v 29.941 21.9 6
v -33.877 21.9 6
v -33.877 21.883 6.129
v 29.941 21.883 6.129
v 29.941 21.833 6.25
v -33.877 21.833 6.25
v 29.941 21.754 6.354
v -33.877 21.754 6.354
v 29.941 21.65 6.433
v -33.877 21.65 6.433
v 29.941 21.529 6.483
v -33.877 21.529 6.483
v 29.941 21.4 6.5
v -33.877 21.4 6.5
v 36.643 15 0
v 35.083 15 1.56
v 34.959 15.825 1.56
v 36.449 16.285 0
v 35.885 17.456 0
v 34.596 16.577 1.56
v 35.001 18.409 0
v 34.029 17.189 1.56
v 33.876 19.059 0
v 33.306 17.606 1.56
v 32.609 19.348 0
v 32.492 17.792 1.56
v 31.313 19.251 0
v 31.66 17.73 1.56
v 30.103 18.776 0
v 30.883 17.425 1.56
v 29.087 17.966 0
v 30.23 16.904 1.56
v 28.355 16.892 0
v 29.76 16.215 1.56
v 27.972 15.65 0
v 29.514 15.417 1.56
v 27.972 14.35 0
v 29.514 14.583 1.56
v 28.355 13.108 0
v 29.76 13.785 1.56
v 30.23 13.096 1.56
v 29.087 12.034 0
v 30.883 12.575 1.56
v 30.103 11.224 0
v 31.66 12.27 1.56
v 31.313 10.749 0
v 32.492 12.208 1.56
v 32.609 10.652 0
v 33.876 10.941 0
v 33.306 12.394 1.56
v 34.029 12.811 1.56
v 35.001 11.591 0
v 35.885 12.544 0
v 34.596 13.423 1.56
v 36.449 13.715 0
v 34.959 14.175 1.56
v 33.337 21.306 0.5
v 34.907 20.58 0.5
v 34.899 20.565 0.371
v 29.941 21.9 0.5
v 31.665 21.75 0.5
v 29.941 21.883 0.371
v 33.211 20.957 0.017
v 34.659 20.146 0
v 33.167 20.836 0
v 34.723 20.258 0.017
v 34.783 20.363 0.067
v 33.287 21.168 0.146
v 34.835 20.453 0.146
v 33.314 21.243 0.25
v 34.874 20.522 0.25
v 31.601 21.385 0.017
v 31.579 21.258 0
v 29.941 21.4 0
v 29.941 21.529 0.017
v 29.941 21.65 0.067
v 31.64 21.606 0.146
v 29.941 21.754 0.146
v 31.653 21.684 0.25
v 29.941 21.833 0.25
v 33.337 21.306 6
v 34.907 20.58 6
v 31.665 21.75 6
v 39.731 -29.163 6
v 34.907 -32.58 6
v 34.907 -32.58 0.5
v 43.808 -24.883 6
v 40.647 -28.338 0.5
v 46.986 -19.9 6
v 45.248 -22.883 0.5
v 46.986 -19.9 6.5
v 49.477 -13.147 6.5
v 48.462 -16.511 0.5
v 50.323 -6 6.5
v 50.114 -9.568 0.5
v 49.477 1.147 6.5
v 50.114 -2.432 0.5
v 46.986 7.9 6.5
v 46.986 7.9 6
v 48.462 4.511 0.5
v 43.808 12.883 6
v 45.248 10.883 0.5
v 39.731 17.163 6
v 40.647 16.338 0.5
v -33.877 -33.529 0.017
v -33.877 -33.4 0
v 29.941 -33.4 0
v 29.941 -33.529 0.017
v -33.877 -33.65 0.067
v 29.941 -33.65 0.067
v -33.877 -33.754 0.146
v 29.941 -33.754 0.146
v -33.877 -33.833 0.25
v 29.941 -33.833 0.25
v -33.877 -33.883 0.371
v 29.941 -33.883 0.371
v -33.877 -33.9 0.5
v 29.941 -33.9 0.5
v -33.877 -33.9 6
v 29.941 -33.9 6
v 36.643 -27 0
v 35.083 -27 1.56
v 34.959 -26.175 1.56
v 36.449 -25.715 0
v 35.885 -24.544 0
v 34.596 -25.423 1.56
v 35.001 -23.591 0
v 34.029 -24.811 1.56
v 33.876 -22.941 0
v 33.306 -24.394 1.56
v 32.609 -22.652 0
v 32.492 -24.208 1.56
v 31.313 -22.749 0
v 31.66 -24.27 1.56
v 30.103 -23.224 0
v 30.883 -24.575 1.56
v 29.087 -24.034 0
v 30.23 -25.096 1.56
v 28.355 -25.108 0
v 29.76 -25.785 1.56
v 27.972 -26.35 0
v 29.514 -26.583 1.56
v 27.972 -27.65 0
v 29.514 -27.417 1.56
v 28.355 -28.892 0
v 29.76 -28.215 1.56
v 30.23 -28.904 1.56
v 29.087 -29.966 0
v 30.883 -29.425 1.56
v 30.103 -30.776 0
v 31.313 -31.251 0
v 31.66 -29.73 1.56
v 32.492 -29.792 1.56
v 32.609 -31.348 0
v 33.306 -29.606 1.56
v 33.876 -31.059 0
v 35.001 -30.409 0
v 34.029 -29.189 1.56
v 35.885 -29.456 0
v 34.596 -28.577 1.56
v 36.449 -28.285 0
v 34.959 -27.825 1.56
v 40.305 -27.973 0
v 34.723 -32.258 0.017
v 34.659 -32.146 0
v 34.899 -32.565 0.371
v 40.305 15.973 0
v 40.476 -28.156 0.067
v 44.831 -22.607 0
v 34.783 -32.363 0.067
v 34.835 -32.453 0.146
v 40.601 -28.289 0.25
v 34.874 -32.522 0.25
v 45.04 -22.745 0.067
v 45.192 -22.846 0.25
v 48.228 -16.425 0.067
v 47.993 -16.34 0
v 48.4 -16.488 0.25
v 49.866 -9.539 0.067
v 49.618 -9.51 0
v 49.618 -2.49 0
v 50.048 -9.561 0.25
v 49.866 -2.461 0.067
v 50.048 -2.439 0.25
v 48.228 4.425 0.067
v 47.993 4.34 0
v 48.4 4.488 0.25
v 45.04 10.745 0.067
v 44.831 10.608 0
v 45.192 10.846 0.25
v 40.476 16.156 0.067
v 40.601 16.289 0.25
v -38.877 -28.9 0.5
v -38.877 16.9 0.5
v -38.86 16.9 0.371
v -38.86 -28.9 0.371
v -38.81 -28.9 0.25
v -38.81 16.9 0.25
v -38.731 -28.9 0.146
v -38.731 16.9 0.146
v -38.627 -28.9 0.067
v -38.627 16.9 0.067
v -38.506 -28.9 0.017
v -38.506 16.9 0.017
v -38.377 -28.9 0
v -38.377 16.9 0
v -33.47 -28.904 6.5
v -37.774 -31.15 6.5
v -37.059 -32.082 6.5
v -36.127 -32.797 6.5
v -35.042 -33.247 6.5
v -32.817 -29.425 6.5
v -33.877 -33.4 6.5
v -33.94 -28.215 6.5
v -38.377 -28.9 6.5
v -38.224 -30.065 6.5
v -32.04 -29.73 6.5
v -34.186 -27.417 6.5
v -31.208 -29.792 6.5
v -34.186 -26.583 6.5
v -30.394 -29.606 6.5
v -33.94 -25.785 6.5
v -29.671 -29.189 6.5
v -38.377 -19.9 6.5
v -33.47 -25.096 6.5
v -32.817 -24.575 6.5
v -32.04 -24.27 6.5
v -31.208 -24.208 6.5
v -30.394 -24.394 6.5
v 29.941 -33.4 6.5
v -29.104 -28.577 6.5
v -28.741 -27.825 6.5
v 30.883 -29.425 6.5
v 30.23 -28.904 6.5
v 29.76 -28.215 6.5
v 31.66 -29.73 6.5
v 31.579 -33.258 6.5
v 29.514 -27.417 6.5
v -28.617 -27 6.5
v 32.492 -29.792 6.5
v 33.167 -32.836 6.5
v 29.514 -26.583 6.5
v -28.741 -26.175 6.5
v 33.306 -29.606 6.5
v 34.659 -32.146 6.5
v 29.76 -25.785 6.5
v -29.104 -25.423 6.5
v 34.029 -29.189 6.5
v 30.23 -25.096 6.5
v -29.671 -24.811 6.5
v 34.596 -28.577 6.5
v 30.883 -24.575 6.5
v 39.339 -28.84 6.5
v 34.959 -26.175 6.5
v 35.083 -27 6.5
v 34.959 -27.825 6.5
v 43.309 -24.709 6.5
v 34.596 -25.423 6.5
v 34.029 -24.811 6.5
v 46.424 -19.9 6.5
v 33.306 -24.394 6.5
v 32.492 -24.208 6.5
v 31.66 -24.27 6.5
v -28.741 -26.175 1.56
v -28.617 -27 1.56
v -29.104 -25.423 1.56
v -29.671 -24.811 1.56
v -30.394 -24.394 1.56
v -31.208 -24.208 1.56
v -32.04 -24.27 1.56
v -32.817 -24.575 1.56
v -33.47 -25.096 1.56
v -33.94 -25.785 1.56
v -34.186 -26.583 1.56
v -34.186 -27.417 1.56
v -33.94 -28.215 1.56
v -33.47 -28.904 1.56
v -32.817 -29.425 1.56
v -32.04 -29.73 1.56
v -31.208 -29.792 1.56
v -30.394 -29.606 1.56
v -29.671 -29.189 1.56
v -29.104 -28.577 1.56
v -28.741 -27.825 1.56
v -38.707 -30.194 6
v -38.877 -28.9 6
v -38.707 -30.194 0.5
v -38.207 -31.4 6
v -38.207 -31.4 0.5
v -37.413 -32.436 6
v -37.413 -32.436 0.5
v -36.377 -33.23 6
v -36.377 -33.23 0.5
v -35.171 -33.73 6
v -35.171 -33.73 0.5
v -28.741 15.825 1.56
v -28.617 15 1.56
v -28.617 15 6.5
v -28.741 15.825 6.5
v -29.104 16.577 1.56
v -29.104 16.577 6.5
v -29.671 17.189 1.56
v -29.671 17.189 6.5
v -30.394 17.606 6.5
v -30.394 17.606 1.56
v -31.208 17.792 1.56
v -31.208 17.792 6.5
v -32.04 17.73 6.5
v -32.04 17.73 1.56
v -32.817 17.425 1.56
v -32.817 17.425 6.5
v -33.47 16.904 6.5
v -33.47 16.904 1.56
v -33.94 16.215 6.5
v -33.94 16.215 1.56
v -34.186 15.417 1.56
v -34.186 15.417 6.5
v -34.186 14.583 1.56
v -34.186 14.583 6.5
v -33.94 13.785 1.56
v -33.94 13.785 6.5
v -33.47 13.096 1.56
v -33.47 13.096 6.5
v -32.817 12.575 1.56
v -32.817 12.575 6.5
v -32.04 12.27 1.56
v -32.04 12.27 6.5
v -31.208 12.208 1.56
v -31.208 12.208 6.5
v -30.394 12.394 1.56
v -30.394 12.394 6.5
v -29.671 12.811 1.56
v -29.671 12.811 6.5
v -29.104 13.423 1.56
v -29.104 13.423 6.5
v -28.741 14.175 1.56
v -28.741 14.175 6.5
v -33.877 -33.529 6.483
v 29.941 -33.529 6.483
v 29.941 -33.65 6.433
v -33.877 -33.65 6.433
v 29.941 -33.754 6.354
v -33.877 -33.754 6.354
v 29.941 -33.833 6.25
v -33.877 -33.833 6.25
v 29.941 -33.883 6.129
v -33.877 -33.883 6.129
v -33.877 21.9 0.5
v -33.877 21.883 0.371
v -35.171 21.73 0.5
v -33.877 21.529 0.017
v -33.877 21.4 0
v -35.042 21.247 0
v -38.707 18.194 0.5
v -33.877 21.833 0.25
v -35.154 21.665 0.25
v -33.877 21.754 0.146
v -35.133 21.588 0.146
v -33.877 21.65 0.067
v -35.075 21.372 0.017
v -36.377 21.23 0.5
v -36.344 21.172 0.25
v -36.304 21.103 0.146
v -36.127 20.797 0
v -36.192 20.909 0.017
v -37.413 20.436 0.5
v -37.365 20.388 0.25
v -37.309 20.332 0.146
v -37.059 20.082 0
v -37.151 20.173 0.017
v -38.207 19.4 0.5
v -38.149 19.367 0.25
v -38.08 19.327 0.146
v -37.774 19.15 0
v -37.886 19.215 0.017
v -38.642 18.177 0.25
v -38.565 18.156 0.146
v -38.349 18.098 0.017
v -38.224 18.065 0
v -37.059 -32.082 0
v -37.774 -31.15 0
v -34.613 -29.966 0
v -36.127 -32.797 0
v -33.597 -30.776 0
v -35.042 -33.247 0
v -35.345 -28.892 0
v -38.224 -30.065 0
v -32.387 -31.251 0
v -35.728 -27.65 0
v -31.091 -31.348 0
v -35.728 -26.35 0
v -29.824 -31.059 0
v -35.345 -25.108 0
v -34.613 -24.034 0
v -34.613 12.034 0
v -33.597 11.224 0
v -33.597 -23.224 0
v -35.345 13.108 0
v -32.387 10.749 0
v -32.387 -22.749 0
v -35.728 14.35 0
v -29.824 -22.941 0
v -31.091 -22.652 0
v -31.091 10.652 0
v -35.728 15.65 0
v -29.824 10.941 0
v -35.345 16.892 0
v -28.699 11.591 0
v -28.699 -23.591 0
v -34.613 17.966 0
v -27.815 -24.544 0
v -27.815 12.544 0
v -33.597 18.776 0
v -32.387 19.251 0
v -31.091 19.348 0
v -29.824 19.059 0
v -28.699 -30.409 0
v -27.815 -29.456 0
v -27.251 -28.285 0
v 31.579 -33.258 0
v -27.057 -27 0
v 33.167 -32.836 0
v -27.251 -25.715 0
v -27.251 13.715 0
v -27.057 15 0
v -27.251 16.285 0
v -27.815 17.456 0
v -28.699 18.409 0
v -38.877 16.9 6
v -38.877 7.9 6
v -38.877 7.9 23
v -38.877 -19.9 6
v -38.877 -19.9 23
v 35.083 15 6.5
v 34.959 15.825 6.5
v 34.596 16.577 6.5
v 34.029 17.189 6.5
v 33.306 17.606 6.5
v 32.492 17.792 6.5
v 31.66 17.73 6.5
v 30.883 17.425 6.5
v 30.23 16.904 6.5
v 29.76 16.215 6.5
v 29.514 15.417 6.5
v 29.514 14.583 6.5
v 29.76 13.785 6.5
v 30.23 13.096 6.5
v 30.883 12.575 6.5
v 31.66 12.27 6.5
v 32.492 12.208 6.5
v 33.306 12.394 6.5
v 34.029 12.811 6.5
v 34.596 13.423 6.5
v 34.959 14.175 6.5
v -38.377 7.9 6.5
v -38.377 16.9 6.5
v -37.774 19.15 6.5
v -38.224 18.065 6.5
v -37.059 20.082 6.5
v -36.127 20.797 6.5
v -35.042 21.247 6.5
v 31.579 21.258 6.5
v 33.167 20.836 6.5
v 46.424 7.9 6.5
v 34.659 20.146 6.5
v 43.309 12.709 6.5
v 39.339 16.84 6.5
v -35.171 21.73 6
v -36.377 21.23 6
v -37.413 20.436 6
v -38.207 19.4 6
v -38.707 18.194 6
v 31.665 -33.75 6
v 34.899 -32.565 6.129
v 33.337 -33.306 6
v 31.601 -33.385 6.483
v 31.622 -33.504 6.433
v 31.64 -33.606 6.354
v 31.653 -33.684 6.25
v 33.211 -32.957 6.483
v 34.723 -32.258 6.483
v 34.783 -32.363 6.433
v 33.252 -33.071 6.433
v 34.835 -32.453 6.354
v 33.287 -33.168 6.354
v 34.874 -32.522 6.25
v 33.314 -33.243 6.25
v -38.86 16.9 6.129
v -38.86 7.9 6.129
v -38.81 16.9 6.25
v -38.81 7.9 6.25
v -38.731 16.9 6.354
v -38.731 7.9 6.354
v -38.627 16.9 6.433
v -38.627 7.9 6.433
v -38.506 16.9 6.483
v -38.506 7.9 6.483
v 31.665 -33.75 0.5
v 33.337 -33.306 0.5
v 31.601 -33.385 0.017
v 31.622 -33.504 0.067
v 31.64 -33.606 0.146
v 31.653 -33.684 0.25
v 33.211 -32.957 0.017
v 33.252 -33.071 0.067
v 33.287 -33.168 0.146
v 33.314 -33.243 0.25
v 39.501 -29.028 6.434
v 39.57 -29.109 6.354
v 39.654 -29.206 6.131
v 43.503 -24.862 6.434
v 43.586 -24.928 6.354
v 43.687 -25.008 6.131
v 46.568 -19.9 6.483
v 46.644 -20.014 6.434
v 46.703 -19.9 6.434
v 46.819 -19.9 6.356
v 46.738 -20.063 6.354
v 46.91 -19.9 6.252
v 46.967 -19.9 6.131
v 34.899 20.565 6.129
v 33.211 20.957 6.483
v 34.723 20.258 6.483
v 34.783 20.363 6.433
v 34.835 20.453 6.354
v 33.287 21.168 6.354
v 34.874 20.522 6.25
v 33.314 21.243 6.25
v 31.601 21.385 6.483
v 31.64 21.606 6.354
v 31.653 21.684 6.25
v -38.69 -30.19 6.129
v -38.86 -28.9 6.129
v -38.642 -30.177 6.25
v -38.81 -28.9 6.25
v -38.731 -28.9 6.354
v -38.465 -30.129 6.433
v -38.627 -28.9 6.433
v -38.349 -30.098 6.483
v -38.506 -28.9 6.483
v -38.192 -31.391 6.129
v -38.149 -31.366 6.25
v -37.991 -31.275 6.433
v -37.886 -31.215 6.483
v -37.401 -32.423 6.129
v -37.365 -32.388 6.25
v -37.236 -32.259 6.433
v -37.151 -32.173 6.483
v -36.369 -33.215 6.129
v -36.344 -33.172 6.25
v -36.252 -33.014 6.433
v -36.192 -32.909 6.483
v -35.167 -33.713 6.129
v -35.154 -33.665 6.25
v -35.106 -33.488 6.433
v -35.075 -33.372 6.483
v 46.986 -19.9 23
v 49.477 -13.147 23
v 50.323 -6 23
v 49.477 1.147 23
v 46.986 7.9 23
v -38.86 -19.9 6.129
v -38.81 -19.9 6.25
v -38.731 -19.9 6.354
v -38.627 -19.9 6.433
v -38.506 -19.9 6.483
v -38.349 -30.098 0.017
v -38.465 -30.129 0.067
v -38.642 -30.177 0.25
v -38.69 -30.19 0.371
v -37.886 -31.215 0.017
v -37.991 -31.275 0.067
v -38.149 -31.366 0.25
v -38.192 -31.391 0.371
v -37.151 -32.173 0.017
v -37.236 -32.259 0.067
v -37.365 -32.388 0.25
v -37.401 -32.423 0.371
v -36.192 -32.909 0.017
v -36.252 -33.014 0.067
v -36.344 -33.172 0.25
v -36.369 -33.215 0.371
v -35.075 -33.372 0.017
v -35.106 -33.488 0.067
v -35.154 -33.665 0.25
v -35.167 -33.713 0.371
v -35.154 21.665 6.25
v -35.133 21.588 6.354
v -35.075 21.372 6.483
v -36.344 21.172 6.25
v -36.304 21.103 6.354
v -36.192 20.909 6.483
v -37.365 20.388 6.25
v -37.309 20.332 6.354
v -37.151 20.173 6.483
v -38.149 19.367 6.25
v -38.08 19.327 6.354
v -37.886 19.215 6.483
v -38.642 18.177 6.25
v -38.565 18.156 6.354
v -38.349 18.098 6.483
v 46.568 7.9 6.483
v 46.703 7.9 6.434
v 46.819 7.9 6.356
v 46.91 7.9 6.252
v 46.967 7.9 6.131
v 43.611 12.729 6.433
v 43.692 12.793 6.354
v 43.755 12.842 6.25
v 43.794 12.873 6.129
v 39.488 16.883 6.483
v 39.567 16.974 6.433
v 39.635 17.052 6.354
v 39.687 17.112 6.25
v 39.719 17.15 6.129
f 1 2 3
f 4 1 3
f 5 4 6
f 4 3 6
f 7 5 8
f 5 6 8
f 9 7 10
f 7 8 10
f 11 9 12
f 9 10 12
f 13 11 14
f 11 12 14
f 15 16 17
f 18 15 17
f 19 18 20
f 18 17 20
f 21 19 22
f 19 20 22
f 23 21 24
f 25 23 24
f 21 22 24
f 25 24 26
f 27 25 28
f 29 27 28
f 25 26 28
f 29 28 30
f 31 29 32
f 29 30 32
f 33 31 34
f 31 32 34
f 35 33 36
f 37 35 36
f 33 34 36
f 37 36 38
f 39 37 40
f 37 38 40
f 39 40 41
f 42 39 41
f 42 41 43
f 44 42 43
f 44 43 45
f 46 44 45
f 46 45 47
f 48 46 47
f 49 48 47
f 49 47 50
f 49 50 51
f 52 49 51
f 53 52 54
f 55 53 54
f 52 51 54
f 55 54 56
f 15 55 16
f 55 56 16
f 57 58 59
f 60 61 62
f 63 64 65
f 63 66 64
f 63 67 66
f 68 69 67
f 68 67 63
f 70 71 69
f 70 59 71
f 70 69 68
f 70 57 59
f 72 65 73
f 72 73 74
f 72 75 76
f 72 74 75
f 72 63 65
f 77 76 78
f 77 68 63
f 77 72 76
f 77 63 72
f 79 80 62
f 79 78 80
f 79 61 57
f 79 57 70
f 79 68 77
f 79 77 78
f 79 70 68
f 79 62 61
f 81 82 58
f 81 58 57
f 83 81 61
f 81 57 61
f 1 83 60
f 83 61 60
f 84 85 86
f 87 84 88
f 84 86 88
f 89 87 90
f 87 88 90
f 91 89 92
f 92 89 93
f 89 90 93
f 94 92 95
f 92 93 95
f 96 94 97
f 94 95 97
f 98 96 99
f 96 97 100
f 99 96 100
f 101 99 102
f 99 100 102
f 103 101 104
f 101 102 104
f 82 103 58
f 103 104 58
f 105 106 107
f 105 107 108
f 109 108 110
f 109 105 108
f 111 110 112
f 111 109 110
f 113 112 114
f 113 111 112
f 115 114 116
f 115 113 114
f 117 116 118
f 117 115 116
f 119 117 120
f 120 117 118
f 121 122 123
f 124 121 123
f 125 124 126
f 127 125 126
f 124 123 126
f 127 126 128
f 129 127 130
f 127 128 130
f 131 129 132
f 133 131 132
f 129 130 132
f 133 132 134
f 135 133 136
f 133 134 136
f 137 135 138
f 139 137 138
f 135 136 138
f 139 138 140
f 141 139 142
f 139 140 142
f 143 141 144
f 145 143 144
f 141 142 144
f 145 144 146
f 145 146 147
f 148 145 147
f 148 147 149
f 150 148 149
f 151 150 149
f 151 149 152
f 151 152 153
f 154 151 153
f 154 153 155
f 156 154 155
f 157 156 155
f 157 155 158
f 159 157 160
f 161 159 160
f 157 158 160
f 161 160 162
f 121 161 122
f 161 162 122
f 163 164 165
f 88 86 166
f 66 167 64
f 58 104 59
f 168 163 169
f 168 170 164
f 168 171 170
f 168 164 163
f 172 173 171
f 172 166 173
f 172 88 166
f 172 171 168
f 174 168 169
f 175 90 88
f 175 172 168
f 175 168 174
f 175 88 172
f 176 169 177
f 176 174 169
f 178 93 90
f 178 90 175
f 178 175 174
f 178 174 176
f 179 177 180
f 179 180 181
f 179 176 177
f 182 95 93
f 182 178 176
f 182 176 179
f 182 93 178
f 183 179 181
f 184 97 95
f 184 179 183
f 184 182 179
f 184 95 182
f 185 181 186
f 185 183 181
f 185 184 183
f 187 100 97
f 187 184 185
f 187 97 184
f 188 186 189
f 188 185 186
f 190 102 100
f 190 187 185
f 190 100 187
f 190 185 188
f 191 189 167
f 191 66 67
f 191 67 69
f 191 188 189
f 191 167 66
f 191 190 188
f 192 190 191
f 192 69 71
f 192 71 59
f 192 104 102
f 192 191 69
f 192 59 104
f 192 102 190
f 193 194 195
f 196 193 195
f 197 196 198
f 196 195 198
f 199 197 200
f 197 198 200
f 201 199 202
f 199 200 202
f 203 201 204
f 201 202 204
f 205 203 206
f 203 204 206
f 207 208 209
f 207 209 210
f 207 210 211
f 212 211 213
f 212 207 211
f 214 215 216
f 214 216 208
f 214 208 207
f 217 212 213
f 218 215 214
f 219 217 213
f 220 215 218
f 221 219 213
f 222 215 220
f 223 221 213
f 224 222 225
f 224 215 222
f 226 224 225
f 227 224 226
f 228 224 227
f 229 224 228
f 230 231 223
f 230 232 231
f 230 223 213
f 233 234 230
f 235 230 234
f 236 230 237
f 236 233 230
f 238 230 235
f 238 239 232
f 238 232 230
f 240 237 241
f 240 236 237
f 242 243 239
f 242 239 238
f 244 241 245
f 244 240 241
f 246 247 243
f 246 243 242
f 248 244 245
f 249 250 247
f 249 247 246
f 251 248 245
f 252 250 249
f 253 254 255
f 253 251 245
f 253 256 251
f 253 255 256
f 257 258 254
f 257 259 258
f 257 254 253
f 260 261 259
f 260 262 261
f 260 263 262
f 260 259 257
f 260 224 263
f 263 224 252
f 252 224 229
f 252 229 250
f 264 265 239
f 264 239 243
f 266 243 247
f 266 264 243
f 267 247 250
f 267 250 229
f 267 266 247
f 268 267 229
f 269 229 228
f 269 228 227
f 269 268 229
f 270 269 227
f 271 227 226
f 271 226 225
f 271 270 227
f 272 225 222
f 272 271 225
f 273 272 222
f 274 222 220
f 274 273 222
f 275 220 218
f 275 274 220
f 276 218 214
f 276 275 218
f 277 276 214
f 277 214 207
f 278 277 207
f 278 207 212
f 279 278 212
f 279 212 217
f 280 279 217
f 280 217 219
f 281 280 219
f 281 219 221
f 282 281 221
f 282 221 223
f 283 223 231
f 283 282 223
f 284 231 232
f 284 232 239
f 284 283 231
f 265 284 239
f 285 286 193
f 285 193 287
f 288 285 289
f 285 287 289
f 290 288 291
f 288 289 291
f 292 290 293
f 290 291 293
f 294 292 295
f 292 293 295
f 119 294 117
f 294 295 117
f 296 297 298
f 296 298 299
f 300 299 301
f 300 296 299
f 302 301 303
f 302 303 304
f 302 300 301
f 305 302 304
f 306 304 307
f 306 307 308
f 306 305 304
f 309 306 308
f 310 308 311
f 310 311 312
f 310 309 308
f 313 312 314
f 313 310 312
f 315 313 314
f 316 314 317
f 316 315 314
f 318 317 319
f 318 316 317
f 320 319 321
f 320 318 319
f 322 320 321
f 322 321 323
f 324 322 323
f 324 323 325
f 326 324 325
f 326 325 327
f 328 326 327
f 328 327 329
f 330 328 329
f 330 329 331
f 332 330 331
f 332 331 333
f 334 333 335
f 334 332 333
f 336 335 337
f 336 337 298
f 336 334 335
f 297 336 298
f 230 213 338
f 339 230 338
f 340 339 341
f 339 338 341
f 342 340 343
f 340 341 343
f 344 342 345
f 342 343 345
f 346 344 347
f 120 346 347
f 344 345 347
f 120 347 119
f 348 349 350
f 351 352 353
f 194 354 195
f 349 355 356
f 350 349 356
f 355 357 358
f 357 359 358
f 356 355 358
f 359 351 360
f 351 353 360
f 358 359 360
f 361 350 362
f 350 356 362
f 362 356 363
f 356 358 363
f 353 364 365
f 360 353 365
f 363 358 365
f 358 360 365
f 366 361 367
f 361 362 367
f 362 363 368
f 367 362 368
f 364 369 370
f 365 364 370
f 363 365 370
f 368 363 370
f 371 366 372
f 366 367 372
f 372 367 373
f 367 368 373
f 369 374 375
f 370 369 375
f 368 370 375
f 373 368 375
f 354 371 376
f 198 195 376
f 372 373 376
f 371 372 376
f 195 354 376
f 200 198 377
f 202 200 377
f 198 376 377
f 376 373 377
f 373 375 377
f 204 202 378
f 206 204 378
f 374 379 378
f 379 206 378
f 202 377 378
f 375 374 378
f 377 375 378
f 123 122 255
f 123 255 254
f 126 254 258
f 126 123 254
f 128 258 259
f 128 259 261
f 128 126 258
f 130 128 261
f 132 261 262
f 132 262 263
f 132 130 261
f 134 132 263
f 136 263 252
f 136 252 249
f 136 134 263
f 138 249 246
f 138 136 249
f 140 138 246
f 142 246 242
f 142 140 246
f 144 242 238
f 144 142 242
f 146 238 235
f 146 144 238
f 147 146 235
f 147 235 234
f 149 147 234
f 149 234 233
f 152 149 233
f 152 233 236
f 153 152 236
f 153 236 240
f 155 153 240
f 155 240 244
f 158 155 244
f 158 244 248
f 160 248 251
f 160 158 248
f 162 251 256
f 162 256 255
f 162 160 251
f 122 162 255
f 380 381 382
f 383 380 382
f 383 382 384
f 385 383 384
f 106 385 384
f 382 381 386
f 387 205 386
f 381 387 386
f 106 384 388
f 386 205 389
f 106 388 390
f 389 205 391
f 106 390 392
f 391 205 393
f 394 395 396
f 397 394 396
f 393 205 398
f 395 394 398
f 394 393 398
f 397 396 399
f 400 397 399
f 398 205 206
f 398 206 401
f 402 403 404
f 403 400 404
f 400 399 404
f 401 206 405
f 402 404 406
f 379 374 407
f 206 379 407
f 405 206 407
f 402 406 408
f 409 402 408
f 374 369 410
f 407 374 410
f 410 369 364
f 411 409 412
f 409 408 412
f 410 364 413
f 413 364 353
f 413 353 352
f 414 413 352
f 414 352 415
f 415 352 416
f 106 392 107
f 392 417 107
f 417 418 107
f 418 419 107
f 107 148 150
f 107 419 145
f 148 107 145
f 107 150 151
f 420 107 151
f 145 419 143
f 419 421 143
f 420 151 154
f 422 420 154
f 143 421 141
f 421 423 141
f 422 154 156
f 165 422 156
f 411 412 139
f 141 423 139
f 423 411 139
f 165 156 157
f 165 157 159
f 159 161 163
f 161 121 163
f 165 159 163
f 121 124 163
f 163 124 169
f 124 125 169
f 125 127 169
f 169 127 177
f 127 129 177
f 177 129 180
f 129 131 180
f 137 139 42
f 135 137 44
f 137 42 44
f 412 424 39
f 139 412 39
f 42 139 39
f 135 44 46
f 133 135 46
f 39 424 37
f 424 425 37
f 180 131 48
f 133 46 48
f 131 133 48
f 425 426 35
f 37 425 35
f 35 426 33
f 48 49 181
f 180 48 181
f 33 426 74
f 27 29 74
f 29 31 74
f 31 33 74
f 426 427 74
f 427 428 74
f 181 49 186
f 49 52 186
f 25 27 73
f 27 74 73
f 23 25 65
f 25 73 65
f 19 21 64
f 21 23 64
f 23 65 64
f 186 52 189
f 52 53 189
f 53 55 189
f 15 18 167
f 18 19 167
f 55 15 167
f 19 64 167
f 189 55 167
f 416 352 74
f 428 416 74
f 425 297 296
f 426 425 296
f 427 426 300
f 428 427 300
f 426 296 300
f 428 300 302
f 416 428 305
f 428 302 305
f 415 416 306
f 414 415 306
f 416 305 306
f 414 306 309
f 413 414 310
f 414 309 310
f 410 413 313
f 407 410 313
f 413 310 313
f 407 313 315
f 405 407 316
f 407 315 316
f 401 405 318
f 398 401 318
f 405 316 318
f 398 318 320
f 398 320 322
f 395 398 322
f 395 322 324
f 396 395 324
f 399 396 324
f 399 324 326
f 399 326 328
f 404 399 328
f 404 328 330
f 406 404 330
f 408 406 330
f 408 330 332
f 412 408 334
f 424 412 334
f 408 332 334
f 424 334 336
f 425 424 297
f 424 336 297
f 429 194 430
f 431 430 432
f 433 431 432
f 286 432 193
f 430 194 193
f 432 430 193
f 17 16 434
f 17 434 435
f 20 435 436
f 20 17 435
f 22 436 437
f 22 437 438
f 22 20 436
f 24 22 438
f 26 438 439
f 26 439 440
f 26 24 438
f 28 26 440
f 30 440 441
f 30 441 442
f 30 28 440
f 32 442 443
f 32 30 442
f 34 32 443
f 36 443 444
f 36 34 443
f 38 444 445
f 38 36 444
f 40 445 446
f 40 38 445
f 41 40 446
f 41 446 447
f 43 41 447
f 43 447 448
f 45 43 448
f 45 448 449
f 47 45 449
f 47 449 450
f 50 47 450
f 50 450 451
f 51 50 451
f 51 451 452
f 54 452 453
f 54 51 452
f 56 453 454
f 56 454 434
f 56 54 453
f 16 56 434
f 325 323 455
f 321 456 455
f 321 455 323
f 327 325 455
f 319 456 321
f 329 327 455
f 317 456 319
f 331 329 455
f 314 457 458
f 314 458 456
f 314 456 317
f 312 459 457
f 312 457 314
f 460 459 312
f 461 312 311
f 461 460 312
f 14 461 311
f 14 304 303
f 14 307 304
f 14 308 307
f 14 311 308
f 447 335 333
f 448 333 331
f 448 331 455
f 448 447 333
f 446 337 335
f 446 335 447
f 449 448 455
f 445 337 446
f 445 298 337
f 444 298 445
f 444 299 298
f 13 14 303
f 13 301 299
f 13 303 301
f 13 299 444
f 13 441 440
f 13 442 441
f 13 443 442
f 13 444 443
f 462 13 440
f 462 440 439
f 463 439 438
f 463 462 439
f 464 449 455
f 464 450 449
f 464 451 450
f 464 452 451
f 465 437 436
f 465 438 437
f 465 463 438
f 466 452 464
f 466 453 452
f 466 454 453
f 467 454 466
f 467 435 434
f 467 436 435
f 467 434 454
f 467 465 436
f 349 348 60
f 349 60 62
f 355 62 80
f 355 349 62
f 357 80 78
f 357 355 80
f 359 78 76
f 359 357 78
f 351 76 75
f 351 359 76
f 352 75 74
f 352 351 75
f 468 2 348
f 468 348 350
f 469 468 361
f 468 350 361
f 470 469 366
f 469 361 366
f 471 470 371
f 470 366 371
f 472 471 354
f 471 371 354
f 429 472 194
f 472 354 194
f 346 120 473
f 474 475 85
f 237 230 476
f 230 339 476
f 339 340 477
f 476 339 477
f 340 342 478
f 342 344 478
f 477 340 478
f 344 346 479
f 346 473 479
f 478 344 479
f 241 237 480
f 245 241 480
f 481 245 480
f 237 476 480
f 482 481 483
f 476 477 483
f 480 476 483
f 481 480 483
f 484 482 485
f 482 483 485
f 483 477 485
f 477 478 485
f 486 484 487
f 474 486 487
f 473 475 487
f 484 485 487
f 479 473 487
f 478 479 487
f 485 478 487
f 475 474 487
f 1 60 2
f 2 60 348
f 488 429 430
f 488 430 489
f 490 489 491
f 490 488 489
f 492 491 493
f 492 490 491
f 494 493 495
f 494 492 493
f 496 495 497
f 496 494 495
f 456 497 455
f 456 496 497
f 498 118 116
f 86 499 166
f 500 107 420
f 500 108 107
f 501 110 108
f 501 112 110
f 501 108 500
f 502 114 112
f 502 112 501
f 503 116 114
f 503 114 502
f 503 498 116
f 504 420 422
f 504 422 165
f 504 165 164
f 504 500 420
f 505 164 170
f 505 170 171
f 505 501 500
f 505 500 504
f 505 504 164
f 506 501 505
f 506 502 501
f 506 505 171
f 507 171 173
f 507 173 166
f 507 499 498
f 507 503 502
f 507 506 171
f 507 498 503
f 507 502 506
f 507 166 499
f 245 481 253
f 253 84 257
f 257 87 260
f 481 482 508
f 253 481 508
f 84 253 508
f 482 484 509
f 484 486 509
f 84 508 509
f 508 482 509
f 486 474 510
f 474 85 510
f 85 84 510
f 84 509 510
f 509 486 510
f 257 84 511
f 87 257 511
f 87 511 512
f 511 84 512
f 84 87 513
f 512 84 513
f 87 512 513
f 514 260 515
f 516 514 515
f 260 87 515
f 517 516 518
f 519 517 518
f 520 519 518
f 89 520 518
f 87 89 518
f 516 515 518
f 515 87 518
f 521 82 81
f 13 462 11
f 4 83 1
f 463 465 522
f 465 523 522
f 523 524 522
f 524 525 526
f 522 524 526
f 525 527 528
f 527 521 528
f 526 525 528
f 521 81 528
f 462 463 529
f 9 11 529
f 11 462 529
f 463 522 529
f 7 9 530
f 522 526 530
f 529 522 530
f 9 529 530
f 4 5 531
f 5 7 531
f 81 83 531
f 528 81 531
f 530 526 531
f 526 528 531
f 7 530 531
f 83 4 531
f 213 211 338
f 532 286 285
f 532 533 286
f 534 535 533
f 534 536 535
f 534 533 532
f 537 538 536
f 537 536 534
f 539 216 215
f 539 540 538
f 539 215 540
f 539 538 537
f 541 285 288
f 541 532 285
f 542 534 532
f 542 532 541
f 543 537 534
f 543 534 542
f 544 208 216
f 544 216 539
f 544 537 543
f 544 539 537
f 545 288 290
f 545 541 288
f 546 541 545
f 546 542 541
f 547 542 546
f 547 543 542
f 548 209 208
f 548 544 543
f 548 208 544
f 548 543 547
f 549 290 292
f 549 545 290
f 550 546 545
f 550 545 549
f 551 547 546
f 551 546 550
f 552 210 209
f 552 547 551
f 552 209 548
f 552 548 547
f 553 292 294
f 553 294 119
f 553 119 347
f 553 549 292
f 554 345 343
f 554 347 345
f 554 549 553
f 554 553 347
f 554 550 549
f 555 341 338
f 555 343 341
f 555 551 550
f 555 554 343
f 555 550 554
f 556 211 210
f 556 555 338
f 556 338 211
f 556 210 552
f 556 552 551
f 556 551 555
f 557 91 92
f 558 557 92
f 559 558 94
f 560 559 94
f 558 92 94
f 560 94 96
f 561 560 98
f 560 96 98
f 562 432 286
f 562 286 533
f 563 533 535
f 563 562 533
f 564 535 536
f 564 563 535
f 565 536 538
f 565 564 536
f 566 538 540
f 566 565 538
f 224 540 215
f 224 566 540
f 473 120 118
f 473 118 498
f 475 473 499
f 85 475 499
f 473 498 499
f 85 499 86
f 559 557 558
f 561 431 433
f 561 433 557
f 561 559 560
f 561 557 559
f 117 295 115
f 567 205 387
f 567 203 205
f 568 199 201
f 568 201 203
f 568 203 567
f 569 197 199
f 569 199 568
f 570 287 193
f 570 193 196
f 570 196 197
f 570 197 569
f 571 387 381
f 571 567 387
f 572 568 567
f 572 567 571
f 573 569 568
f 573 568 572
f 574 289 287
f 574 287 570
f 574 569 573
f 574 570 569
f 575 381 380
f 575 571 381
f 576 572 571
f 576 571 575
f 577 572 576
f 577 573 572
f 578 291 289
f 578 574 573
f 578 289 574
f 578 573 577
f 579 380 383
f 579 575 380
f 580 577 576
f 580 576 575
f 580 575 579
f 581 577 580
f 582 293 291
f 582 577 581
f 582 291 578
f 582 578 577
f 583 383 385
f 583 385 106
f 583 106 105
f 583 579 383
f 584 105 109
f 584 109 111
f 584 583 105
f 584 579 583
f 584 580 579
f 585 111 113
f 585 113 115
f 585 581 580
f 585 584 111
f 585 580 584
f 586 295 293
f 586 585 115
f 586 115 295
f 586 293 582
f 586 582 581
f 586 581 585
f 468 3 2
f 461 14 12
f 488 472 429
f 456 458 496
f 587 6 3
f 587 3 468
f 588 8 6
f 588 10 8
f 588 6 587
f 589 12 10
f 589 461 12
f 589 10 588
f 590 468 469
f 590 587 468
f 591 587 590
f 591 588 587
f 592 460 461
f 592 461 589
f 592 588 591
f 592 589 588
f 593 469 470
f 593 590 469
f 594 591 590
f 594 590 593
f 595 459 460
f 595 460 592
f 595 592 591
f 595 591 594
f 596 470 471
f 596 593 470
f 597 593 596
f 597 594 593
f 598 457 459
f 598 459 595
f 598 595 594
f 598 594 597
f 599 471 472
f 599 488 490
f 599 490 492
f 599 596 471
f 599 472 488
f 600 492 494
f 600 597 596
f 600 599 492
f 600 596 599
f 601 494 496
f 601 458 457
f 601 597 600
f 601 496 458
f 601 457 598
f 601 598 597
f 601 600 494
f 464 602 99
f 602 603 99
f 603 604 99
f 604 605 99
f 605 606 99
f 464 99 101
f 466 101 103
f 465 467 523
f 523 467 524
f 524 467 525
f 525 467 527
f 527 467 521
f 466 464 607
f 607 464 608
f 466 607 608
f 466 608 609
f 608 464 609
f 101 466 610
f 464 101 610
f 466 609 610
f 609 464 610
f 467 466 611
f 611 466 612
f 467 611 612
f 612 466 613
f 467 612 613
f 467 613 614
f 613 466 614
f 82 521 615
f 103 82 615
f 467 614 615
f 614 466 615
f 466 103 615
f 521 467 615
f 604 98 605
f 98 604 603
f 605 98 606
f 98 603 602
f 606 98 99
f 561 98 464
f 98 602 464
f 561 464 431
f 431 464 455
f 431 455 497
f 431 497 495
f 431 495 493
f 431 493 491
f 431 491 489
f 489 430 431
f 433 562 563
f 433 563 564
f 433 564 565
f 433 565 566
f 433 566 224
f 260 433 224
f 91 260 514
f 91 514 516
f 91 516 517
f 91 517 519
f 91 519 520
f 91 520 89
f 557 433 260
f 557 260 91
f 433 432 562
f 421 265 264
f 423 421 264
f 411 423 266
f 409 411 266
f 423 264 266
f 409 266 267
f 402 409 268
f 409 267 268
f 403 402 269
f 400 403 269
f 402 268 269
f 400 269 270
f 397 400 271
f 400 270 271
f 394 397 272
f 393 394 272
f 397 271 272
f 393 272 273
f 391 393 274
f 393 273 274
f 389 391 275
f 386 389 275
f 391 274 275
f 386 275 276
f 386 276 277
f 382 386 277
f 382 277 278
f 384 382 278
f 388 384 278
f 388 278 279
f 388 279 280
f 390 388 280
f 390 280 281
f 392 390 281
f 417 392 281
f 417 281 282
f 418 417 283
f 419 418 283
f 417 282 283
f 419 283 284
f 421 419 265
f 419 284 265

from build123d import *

# Parameters (mm, degrees)
F0_R         = 2.8
F1_DEPTH     = 6.5
F3_DEPTH     = 16.5
F4_T1_DEPTH  = 63.8184719387
F4_T3_DEPTH  = 45.8
F4_T5_DEPTH  = 9
F4_T7_DEPTH  = 9
F4_T10_ANGLE = 90
F4_T12_ANGLE = 120.4504110916
F4_T14_ANGLE = 90
F4_T16_ANGLE = 90
F4_T18_ANGLE = 29.7747944542
F4_T20_ANGLE = 29.7747944542
F4_T22_ANGLE = 29.7747944542
F4_T26_ANGLE = 35.5690080159
F4_T29_ANGLE = 90
F4_T33_ANGLE = 35.5690080159
F4_T36_ANGLE = 29.7747944542
F5_SIZE      = 1.56


# Not quite as in the source:
# - a fillet or chamfer that OpenCascade refuses, or shapes differently, is made with other operations: its cross-section is extruded or revolved along the edge and cut away or added


with BuildPart() as f1:
    # F0 (on Top) → F1 (new body)
    with BuildSketch(Plane.XY):
        with BuildLine():
            Line((-38.8770699501, 16.9000072956), (-38.8770699501, -28.8999927044))
            ThreePointArc((-38.8770699501, -28.8999927044), (-37.412603856, -32.4355266103), (-33.8770699501, -33.8999927044))
            Line((-33.8770699501, -33.8999927044), (29.9414019886, -33.8999927044))
            ThreePointArc((29.9414019886, -33.8999927044), (32.5106042183, -33.5643188528), (34.9073236464, -32.579832685))
            ThreePointArc((34.9073236464, -32.579832685), (50.3229300499, -5.9999927044), (34.9073236464, 20.5798472762))
            ThreePointArc((34.9073236464, 20.5798472762), (32.5106042183, 21.564333444), (29.9414019886, 21.9000072956))
            Line((29.9414019886, 21.9000072956), (-33.8770699501, 21.9000072956))
            ThreePointArc((-33.8770699501, 21.9000072956), (-37.412603856, 20.4355412015), (-38.8770699501, 16.9000072956))
        make_face()
        with Locations((-31.4170904458, -26.9999932498)):
            Circle(F0_R, mode=Mode.SUBTRACT)
        with Locations((32.2829300499, -26.9999927044)):
            Circle(F0_R, mode=Mode.SUBTRACT)
        with Locations((-31.4170904458, 15.0000071153)):
            Circle(F0_R, mode=Mode.SUBTRACT)
        with Locations((32.2829300499, 15.0000072956)):
            Circle(F0_R, mode=Mode.SUBTRACT)
    extrude(amount=F1_DEPTH)

    # F2 (on face) → F3 (join)
    with BuildSketch(Plane.XY.offset(6.5)):
        with BuildLine():
            Line((-38.8770699501, 7.9000072956), (-38.8770699501, -5.9999927044))
            Line((-38.8770699501, -5.9999927044), (-38.8770699501, -19.8999927044))
            Line((-38.8770699501, -19.8999927044), (46.9864613892, -19.8999927044))
            ThreePointArc((46.9864613892, -19.8999927044), (50.3229300499, -5.9999927044), (46.9864613892, 7.9000072956))
            Line((46.9864613892, 7.9000072956), (-38.8770699501, 7.9000072956))
        make_face()
    extrude(amount=F3_DEPTH)

    # F4: fillet of radius 0.5 on 18 edges, made by hand

    # F4_s2 → F4_t1 (cut)
    with BuildSketch(Plane.YZ.offset(-33.8770699501)):
        with BuildLine():
            ThreePointArc((21.9000072956, 0.5), (21.7535606862, 0.1464466094), (21.4000072956, 0))
            Line((21.4000072956, 0), (21.9000072956, 0))
            Line((21.9000072956, 0), (21.9000072956, 0.5))
        make_face()
        with BuildLine():
            ThreePointArc((21.9000072956, 6), (21.7535606862, 6.3535533906), (21.4000072956, 6.5))
            Line((21.4000072956, 6.5), (21.9000072956, 6.5))
            Line((21.9000072956, 6.5), (21.9000072956, 6))
        make_face()
        with BuildLine():
            ThreePointArc((-33.3999927044, 6.5), (-33.753546095, 6.3535533906), (-33.8999927044, 6))
            Line((-33.8999927044, 6), (-33.8999927044, 6.5))
            Line((-33.8999927044, 6.5), (-33.3999927044, 6.5))
        make_face()
        with BuildLine():
            ThreePointArc((-33.3999927044, 0), (-33.753546095, 0.1464466094), (-33.8999927044, 0.5))
            Line((-33.8999927044, 0.5), (-33.8999927044, 0))
            Line((-33.8999927044, 0), (-33.3999927044, 0))
        make_face()
    extrude(amount=F4_T1_DEPTH, mode=Mode.SUBTRACT)

    # F4_s4 → F4_t3 (cut)
    with BuildSketch(Plane.XZ.offset(-16.9000072956)):
        with BuildLine():
            ThreePointArc((-38.8770699501, 0.5), (-38.7306233407, 0.1464466094), (-38.3770699501, 0))
            Line((-38.3770699501, 0), (-38.8770699501, 0))
            Line((-38.8770699501, 0), (-38.8770699501, 0.5))
        make_face()
    extrude(amount=F4_T3_DEPTH, mode=Mode.SUBTRACT)

    # F4_s6 → F4_t5 (cut)
    with BuildSketch(Plane.XZ.offset(-16.9000072956)):
        with BuildLine():
            ThreePointArc((-38.8770699501, 6), (-38.7306233407, 6.3535533906), (-38.3770699501, 6.5))
            Line((-38.3770699501, 6.5), (-38.8770699501, 6.5))
            Line((-38.8770699501, 6.5), (-38.8770699501, 6))
        make_face()
    extrude(amount=F4_T5_DEPTH, mode=Mode.SUBTRACT)

    # F4_s8 → F4_t7 (cut)
    with BuildSketch(Plane.XZ.offset(19.8999927044)):
        with BuildLine():
            ThreePointArc((-38.8770699501, 6), (-38.7306233407, 6.3535533906), (-38.3770699501, 6.5))
            Line((-38.3770699501, 6.5), (-38.8770699501, 6.5))
            Line((-38.8770699501, 6.5), (-38.8770699501, 6))
        make_face()
    extrude(amount=F4_T7_DEPTH, mode=Mode.SUBTRACT)

    # F4_s9 → F4_t10 (revolve, cut)
    with BuildSketch(Plane.YZ.offset(-33.8770699501)):
        with BuildLine():
            ThreePointArc((21.9000072956, 0.5), (21.7535606862, 0.1464466094), (21.4000072956, 0))
            Line((21.4000072956, 0), (21.9000072956, 0))
            Line((21.9000072956, 0), (21.9000072956, 0.5))
        make_face()
    revolve(axis=Axis((-33.8770699501, 16.9000072956, 0), (0, 0, 1)), revolution_arc=F4_T10_ANGLE, mode=Mode.SUBTRACT)

    # F4_s11 → F4_t12 (revolve, cut)
    with BuildSketch(Plane(origin=(12.2560283734, 7.0119353437, 0), x_dir=(0, 0, 1), z_dir=(-0.8679839981, -0.4965921658, 0))):
        with BuildLine():
            ThreePointArc((0, -45.1134768811), (0.1464466094, -45.4670302717), (0.5, -45.6134768811))
            Line((0.5, -45.6134768811), (0, -45.6134768811))
            Line((0, -45.6134768811), (0, -45.1134768811))
        make_face()
    revolve(axis=Axis((19.7004300499, -5.9999927044, 0), (0, 0, 1)), revolution_arc=F4_T12_ANGLE, mode=Mode.SUBTRACT)

    # F4_s13 → F4_t14 (revolve, cut)
    with BuildSketch(Plane.YZ.offset(-33.8770699501)):
        with BuildLine():
            ThreePointArc((21.9000072956, 6), (21.7535606862, 6.3535533906), (21.4000072956, 6.5))
            Line((21.4000072956, 6.5), (21.9000072956, 6.5))
            Line((21.9000072956, 6.5), (21.9000072956, 6))
        make_face()
    revolve(axis=Axis((-33.8770699501, 16.9000072956, 6.5), (0, 0, 1)), revolution_arc=F4_T14_ANGLE, mode=Mode.SUBTRACT)

    # F4_s15 → F4_t16 (revolve, cut)
    with BuildSketch(Plane.XZ.offset(28.8999927044)):
        with BuildLine():
            ThreePointArc((-38.3770699501, 0), (-38.7306233407, 0.1464466094), (-38.8770699501, 0.5))
            Line((-38.8770699501, 0.5), (-38.8770699501, 0))
            Line((-38.8770699501, 0), (-38.3770699501, 0))
        make_face()
    revolve(axis=Axis((-33.8770699501, -28.8999927044, 0), (0, 0, 1)), revolution_arc=F4_T16_ANGLE, mode=Mode.SUBTRACT)

    # F4_s17 → F4_t18 (revolve, cut)
    with BuildSketch(Plane.YZ.offset(29.9414019886)):
        with BuildLine():
            ThreePointArc((-33.3999927044, 0), (-33.753546095, 0.1464466094), (-33.8999927044, 0.5))
            Line((-33.8999927044, 0.5), (-33.8999927044, 0))
            Line((-33.8999927044, 0), (-33.3999927044, 0))
        make_face()
    revolve(axis=Axis((29.9414019886, -23.8999927044, 0), (0, 0, 1)), revolution_arc=F4_T18_ANGLE, mode=Mode.SUBTRACT)

    # F4_s19 → F4_t20 (revolve, cut)
    with BuildSketch(Plane(origin=(17.4284307256, -9.9711770948, 0), x_dir=(0, 0, 1), z_dir=(0.8679839981, -0.4965921658, 0))):
        with BuildLine():
            ThreePointArc((0, -34.6976815693), (0.1464466094, -35.0512349599), (0.5, -35.1976815693))
            Line((0.5, -35.1976815693), (0, -35.1976815693))
            Line((0, -35.1976815693), (0, -34.6976815693))
        make_face()
    revolve(axis=Axis((29.9414019886, 11.9000072956, 0), (0, 0, 1)), revolution_arc=F4_T20_ANGLE, mode=Mode.SUBTRACT)

    # F4_s21 → F4_t22 (revolve, cut)
    with BuildSketch(Plane(origin=(17.4284307256, -9.9711770948, 0), x_dir=(0, 0, 1), z_dir=(0.8679839981, -0.4965921658, 0))):
        with BuildLine():
            ThreePointArc((6.5, -34.6976815693), (6.3535533906, -35.0512349599), (6, -35.1976815693))
            Line((6, -35.1976815693), (6.5, -35.1976815693))
            Line((6.5, -35.1976815693), (6.5, -34.6976815693))
        make_face()
    revolve(axis=Axis((29.9414019886, 11.9000072956, 6.5), (0, 0, 1)), revolution_arc=F4_T22_ANGLE, mode=Mode.SUBTRACT)


with BuildPart() as f4_tool24:
    # F4_s25 → F4_t26 (revolve)
    with BuildSketch(Plane(origin=(5.7033446243, -12.4249727464, 0), x_dir=(0, 0, 1), z_dir=(0.4171723997, -0.9088273703, 0))):
        with BuildLine():
            ThreePointArc((6.5, -45.5237586807), (6.3535533906, -45.8773120713), (6, -46.0237586807))
            Line((6, -46.0237586807), (6.5, -46.0237586807))
            Line((6.5, -46.0237586807), (6.5, -45.5237586807))
        make_face()
    revolve(axis=Axis((19.7004300499, -5.9999927044, 6.5), (0, 0, 1)), revolution_arc=F4_T26_ANGLE)

    split(bisect_by=Plane.XZ.offset(-7.9000072956), keep=Keep.BOTTOM)


with BuildPart() as f1_1:
    add(f1.part)

    # F4_t23: cut F4_tool24
    add(f4_tool24.part, mode=Mode.SUBTRACT)

    # F4_s28 → F4_t29 (revolve, cut)
    with BuildSketch(Plane.XZ.offset(28.8999927044)):
        with BuildLine():
            ThreePointArc((-38.8770699501, 6), (-38.7306233407, 6.3535533906), (-38.3770699501, 6.5))
            Line((-38.3770699501, 6.5), (-38.8770699501, 6.5))
            Line((-38.8770699501, 6.5), (-38.8770699501, 6))
        make_face()
    revolve(axis=Axis((-33.8770699501, -28.8999927044, 6.5), (0, 0, 1)), revolution_arc=F4_T29_ANGLE, mode=Mode.SUBTRACT)


with BuildPart() as f4_tool31:
    # F4_s32 → F4_t33 (revolve)
    with BuildSketch(Plane(origin=(12.2560283734, 7.0119353437, 0), x_dir=(0, 0, 1), z_dir=(-0.8679839981, -0.4965921658, 0))):
        with BuildLine():
            ThreePointArc((6.5, -45.1134768811), (6.3535533906, -45.4670302717), (6, -45.6134768811))
            Line((6, -45.6134768811), (6.5, -45.6134768811))
            Line((6.5, -45.6134768811), (6.5, -45.1134768811))
        make_face()
    revolve(axis=Axis((19.7004300499, -5.9999927044, 6.5), (0, 0, 1)), revolution_arc=F4_T33_ANGLE)

    split(bisect_by=Plane.XZ.offset(19.8999927044), keep=Keep.TOP)


with BuildPart() as f1_2:
    add(f1_1.part)

    # F4_t30: cut F4_tool31
    add(f4_tool31.part, mode=Mode.SUBTRACT)

    # F4_s35 → F4_t36 (revolve, cut)
    with BuildSketch(Plane.YZ.offset(29.9414019886)):
        with BuildLine():
            ThreePointArc((-33.3999927044, 6.5), (-33.753546095, 6.3535533906), (-33.8999927044, 6))
            Line((-33.8999927044, 6), (-33.8999927044, 6.5))
            Line((-33.8999927044, 6.5), (-33.3999927044, 6.5))
        make_face()
    revolve(axis=Axis((29.9414019886, -23.8999927044, 6.5), (0, 0, 1)), revolution_arc=F4_T36_ANGLE, mode=Mode.SUBTRACT)

    # F5
    f5_edges = [f1_2.edges().sort_by_distance(p)[0] for p in [
        (-34.21709, 15.000007, 0),
        (-34.21709, -26.999993, 0),
        (29.48293, -26.999993, 0),
        (29.48293, 15.000007, 0),
    ]]
    chamfer(f5_edges, length=F5_SIZE)


solid = f1_2.part
